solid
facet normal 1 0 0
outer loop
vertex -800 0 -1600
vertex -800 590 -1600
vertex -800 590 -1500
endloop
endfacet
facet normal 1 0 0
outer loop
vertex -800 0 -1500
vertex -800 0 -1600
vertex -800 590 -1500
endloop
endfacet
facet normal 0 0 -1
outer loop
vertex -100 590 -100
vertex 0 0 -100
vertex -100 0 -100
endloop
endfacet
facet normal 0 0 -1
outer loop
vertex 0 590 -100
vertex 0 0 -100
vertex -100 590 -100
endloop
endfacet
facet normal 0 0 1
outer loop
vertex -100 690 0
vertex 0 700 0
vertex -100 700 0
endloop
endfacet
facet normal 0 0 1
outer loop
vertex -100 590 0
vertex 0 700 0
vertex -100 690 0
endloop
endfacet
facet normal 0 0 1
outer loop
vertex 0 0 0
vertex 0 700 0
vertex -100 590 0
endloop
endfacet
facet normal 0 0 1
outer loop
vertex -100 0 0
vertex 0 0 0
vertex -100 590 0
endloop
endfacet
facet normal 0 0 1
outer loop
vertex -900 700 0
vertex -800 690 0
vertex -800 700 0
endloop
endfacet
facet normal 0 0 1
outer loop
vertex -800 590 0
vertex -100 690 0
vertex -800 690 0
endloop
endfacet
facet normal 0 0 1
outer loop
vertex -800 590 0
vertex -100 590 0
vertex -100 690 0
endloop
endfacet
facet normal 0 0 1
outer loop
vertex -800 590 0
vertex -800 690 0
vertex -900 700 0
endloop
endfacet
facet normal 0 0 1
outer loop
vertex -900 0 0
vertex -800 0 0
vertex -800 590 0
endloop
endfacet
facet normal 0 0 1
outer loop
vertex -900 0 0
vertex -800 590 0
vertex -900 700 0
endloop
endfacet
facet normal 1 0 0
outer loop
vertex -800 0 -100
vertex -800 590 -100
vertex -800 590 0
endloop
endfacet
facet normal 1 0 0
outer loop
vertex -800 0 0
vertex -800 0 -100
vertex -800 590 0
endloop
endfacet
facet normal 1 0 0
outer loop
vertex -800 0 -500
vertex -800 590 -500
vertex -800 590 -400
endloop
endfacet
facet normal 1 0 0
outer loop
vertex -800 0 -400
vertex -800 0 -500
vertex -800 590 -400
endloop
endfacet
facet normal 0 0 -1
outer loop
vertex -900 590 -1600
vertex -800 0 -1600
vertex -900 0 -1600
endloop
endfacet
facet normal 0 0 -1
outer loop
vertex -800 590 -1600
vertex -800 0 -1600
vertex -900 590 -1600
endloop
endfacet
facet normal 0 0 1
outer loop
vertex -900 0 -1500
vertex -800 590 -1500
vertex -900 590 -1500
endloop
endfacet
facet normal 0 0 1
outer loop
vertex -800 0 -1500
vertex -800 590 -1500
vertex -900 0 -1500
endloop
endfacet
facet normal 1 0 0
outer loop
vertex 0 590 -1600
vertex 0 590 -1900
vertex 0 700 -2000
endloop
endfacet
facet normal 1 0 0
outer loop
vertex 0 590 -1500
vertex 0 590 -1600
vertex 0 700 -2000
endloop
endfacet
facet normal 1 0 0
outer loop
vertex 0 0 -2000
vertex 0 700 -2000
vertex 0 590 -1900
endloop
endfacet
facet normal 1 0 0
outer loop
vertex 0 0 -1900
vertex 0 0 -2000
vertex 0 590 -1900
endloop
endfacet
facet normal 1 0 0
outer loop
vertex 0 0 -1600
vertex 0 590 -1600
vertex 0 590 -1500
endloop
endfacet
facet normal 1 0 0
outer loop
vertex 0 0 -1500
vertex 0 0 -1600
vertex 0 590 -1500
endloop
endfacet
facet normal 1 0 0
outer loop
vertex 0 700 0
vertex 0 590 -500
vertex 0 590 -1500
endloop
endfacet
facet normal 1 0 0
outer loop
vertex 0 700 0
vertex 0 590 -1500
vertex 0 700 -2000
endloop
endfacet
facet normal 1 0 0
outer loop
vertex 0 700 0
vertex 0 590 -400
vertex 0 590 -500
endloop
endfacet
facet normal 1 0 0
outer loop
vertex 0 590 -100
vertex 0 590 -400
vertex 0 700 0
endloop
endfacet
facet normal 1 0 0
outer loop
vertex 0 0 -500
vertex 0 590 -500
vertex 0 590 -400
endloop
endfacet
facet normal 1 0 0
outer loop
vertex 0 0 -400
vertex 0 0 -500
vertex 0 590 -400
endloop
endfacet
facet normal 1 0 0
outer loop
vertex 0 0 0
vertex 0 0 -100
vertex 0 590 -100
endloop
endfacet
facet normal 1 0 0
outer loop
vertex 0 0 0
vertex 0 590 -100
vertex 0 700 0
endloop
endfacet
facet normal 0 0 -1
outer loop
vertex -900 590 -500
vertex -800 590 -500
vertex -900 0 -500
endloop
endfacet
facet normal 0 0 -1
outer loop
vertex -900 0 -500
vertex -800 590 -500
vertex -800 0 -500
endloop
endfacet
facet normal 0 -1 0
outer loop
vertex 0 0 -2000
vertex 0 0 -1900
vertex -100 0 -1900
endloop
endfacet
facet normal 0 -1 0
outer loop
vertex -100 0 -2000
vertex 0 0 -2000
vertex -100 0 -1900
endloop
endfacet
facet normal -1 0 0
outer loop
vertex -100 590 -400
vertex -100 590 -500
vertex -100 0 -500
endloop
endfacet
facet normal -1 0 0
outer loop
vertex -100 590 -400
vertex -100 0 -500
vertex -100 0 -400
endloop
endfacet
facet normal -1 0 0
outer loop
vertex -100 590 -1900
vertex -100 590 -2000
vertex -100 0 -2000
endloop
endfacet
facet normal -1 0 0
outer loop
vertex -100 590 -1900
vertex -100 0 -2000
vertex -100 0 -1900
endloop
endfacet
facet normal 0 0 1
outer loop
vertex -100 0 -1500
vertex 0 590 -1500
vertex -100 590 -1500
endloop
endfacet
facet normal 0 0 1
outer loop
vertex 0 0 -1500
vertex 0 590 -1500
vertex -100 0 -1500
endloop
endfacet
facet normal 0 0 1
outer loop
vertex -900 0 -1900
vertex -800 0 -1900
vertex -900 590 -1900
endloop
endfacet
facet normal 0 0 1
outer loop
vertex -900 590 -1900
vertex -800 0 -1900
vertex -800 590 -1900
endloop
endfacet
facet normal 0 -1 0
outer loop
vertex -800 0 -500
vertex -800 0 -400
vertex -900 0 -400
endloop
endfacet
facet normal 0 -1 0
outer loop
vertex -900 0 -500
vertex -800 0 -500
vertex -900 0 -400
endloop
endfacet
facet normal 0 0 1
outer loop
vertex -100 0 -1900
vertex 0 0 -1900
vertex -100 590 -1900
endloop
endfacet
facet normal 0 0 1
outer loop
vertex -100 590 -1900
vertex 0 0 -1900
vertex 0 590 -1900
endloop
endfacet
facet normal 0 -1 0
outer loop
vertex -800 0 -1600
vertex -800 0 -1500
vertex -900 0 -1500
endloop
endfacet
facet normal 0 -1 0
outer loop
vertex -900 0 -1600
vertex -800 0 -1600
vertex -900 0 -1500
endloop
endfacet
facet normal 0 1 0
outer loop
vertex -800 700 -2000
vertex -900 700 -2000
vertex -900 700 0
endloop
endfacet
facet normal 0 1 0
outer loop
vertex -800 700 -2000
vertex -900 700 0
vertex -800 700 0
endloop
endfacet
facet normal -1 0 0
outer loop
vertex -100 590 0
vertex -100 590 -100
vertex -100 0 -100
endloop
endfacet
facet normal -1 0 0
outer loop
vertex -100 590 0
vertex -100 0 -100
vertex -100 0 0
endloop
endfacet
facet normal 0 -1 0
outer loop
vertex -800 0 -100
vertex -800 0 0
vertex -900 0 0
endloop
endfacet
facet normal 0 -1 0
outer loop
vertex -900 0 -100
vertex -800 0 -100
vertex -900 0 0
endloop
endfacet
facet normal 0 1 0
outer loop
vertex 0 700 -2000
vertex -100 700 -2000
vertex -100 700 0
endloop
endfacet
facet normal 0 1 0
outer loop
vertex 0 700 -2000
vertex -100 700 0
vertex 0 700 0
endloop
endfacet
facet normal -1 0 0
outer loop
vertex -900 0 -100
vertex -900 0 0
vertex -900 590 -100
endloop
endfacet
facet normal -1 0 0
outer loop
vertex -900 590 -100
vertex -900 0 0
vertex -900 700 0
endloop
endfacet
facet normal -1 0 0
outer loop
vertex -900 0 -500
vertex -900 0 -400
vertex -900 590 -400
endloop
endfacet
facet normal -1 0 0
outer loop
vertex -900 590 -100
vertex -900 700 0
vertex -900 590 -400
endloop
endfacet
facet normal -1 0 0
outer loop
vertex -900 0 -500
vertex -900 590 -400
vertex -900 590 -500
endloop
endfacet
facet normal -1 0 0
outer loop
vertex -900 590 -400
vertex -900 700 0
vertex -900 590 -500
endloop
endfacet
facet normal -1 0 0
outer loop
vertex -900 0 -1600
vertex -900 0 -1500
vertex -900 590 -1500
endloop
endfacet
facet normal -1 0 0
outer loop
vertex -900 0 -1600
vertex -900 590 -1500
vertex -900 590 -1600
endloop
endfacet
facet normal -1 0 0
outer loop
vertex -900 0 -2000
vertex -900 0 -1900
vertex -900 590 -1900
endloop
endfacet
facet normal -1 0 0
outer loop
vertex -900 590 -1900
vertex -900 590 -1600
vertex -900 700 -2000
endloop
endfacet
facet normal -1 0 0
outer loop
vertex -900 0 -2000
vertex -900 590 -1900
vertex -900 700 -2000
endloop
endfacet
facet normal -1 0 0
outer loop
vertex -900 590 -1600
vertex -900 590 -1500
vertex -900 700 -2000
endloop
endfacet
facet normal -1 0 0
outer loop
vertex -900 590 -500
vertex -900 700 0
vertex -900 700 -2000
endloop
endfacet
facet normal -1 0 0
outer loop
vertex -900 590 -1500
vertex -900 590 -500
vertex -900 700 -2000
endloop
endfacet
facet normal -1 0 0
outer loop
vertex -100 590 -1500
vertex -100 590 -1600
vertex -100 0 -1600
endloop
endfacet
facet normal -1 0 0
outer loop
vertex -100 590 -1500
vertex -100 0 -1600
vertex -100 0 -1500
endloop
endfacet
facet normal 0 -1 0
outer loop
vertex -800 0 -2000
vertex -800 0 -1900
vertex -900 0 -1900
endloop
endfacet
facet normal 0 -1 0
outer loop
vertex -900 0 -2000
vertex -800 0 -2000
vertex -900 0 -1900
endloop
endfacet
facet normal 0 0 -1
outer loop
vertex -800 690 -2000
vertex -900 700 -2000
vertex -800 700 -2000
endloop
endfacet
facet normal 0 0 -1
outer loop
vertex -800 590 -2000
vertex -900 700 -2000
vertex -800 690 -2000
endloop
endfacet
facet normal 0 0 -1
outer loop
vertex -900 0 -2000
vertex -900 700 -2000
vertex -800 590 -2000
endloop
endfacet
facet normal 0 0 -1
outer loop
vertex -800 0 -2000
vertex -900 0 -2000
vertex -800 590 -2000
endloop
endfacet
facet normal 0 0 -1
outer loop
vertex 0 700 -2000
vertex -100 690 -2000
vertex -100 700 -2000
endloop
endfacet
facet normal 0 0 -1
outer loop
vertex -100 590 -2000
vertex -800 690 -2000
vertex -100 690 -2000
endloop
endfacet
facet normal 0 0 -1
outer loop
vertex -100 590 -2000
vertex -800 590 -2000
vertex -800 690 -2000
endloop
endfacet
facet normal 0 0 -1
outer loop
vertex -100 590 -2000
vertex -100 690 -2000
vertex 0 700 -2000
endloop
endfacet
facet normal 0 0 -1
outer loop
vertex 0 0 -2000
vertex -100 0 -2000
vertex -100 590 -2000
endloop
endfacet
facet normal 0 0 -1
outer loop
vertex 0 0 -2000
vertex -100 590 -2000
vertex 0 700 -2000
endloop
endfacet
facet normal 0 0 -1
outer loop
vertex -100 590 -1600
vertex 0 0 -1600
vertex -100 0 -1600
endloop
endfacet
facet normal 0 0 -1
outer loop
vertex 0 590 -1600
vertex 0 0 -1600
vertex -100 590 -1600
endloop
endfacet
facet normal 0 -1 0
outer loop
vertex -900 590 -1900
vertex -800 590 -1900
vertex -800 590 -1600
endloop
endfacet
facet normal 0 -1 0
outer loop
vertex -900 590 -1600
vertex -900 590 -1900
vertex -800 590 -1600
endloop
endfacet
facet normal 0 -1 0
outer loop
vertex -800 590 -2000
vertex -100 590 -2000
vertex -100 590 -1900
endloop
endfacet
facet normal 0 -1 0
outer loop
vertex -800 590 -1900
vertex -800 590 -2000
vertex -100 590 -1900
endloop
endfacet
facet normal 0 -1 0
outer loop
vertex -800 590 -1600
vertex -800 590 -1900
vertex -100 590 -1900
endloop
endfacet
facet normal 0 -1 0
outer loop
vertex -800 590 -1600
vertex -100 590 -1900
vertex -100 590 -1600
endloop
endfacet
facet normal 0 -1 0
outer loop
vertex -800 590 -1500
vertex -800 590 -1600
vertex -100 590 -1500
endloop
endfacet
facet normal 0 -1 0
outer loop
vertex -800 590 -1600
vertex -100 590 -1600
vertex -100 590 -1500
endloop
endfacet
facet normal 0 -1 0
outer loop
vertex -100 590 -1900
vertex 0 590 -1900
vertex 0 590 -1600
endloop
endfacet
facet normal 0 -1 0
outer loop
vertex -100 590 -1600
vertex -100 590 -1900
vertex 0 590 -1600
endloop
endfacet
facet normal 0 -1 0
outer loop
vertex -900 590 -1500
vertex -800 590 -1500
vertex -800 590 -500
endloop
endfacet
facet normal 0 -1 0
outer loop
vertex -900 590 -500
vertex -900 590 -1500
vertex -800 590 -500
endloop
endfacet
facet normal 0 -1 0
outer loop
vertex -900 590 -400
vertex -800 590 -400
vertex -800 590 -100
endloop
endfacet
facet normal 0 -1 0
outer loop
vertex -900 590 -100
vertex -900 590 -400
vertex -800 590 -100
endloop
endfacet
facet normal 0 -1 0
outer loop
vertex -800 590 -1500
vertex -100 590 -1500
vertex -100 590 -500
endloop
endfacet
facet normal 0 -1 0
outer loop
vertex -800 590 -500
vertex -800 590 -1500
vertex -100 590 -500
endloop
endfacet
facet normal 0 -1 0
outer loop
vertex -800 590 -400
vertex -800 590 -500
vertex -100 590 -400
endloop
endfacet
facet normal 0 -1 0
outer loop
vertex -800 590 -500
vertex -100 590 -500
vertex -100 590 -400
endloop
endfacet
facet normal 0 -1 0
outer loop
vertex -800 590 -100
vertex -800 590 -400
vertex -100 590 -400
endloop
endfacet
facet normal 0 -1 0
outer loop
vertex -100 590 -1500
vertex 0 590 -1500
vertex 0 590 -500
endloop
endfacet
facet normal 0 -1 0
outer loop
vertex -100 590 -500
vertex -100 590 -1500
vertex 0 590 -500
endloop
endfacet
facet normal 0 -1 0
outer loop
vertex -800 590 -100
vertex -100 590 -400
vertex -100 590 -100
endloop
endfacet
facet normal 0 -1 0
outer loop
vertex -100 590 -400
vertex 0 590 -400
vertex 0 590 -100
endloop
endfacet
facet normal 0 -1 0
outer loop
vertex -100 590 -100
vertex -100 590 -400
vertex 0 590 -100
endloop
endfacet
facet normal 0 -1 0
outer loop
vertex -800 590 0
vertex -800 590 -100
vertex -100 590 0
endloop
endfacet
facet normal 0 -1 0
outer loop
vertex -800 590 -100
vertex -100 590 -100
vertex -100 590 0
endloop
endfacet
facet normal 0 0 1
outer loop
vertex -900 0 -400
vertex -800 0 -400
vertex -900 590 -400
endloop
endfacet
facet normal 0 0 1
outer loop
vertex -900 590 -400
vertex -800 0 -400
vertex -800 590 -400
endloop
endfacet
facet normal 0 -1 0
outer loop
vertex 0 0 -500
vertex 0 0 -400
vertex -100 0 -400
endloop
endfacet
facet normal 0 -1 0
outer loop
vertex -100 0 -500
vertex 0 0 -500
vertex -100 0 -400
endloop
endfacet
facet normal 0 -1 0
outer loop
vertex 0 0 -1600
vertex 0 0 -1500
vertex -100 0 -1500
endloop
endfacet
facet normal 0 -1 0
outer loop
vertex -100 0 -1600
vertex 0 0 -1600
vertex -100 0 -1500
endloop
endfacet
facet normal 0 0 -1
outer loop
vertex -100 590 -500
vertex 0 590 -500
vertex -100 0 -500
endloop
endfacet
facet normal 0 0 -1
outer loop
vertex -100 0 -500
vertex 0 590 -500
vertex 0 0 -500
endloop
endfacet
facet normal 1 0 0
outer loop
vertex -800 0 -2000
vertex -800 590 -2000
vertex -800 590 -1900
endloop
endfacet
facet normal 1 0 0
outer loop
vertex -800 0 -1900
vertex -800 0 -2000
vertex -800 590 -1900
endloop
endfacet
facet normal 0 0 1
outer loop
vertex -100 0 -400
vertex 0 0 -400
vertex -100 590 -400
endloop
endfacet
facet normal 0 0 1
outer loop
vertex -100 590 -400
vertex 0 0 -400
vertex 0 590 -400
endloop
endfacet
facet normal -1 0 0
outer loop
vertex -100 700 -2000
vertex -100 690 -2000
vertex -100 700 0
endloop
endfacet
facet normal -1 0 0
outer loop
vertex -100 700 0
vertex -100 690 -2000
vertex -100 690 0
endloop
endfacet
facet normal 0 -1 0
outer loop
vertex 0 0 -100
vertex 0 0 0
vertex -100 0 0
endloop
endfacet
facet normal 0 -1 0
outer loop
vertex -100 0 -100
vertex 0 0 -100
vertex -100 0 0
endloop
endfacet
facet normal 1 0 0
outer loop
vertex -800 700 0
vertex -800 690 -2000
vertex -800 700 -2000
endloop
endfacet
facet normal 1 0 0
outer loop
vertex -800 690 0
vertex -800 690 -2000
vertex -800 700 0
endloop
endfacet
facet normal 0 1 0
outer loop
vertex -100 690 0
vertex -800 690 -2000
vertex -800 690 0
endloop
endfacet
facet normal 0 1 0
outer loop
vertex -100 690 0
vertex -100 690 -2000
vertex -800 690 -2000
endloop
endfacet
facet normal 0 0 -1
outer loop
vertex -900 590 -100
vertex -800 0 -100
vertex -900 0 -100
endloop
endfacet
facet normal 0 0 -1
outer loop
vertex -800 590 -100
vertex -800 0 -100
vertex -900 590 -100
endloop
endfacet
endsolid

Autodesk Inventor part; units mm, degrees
ref_plane "YZ Plane" through (0, 0, 0) normal (1, 0, 0) x (0, 1, 0)
ref_plane "XZ Plane" through (0, 0, 0) normal (0, 1, 0) x (-1, 0, 0)
ref_plane "XY Plane" through (0, 0, 0) normal (0, 0, 1) x (1, 0, 0)
sketch "Sketch9" plane through (0, 0, 0) normal (0, 1, 0) x (-1, 0, 0)
  line L0 (0, 0) -> (900, 0)
  line L1 (900, 0) -> (900, -2000)
  line L2 (900, -2000) -> (0, -2000)
  line L3 (0, -2000) -> (0, 0)
  line L4 (900, -2000) -> (800, -2000)
  line L5 (800, -2000) -> (800, 3000)
  line L6 (800, 3000) -> (900, 3000)
  line L7 (900, 3000) -> (900, -2000)
  line L8 (0, -2000) -> (100, -2000)
  line L9 (100, -2000) -> (100, 0)
  line L10 (100, 0) -> (0, 0)
  line L11 (0, 0) -> (0, -2000)
  point P0 (100, -2000)
  point P1 (800, 0)
  dimension "d70" = 900
  dimension "d71" = 100
  dimension "d72" = 100
  dimension "d106" = 2000
extrude "Extrusion6" add sketch "Sketch9" along normal blind 990 contours L0 L9 L2 L3 | L0 L1 L2 L5
sketch "Sketch10" plane through (0, 0, 0) normal (1, 0, 0) x (0, 0, -1)
  line L0 (0, 0) -> (0, 990) projected
  line L1 (0, 990) -> (5000, 990)
  line L2 (5000, 990) -> (5000, 490)
  line L3 (5000, 490) -> (0, 490)
  line L4 (0, 490) -> (0, 990)
  line L5 (0, 990) -> (5000, 990)
  line L6 (5000, 990) -> (5000, 590)
  line L7 (5000, 590) -> (0, 590)
  line L8 (0, 590) -> (0, 990)
  line L9 (0, 990) -> (5000, 990)
  line L10 (5000, 990) -> (5000, 690)
  line L11 (5000, 690) -> (0, 690)
  line L12 (0, 690) -> (0, 990)
  line L13 (2000, 0) -> (0, 0) projected
  line L14 (0, 0) -> (500, 0)
  line L15 (500, 0) -> (500, 600)
  line L16 (500, 600) -> (0, 600)
  line L17 (0, 600) -> (0, 0)
  line L18 (2000, 0) -> (1500, 0)
  line L19 (1500, 0) -> (1500, 600)
  line L20 (1500, 600) -> (2000, 600)
  line L21 (2000, 600) -> (2000, 0)
  point P0 (5000, 690)
  point P1 (0, 690)
  point P2 (0, 590)
  dimension "d83" = 500
  dimension "d84" = 500
  dimension "d85" = 600
  dimension "d86" = 600
extrude "Extrusion7" add sketch "Sketch10" against normal blind 900 contours L0 L16 L15 L7 | L0 L11 L2 L7 L21 L20 L19 L15 L16 | L19 L20 L21 L7
sketch "Sketch13" plane through (0, 990, 0) normal (0, 1, 0) x (1, 0, 0)
  line L0 (-900, 2000) -> (-900, 0) projected
  line L1 (0, 0) -> (0, 2000) projected
  line L2 (-900, 0) -> (0, 0)
  line L3 (0, 0) -> (0, 2000)
  line L4 (0, 2000) -> (-900, 2000)
  line L5 (-900, 2000) -> (-900, 0)
  point P0 (0, 4500)
extrude "Extrusion9" cut sketch "Sketch13" against normal blind 290
sketch "Boceto15" plane through (0, 690, -2000) normal (0, 1, 0) x (1, 0, 0)
  line L0 (-900, 0) -> (-900, 3000) projected
  line L1 (0, 0) -> (-100, 0) projected
  line L2 (-900, 3000) -> (0, 3000)
  line L3 (0, 3000) -> (0, 0)
  line L4 (0, 0) -> (-900, 0)
  line L5 (-900, 0) -> (-900, 3000)
  point P0 (0, -2000)
  point P1 (-100, 0)
extrude "Extrusión11" cut sketch "Boceto15" against normal blind 1500
sketch "Boceto16" plane through (0, 0, 0) normal (1, 0, 0) x (0, 0, -1)
  line L0 (0, 0) -> (500, 0)
  line L1 (2000, 0) -> (0, 0) projected
  line L2 (2000, 0) -> (1500, 0)
  line L3 (0, 590) -> (2000, 590) projected
  line L4 (500, 0) -> (400, 0)
  line L5 (400, 0) -> (400, 590)
  line L6 (400, 590) -> (500, 590)
  line L7 (500, 590) -> (500, 0)
  line L8 (0, 0) -> (100, 0)
  line L9 (100, 0) -> (100, 590)
  line L10 (100, 590) -> (0, 590)
  line L11 (0, 590) -> (0, 0)
  line L12 (2000, 0) -> (1900, 0)
  line L13 (1900, 0) -> (1900, 590)
  line L14 (1900, 590) -> (2000, 590)
  line L15 (2000, 590) -> (2000, 0)
  line L16 (1500, 0) -> (1600, 0)
  line L17 (1600, 0) -> (1600, 590)
  line L18 (1600, 590) -> (1500, 590)
  line L19 (1500, 590) -> (1500, 0)
  point P0 (1600, 590)
  point P1 (100, 590)
  point P2 (1500, 590)
  dimension "d110" = 500
  dimension "d111" = 500
  dimension "d112" = 100
  dimension "d113" = 100
  dimension "d114" = 100
  dimension "d115" = 100
extrude "Extrusión12" cut sketch "Boceto16" against normal blind 1500 contours L9 L3 L5 L0 | L7 L3 L19 L1 | L17 L3 L13 L1
properties part number "B_Transportadora_Recta_5m" material "Aluminum 6061"
